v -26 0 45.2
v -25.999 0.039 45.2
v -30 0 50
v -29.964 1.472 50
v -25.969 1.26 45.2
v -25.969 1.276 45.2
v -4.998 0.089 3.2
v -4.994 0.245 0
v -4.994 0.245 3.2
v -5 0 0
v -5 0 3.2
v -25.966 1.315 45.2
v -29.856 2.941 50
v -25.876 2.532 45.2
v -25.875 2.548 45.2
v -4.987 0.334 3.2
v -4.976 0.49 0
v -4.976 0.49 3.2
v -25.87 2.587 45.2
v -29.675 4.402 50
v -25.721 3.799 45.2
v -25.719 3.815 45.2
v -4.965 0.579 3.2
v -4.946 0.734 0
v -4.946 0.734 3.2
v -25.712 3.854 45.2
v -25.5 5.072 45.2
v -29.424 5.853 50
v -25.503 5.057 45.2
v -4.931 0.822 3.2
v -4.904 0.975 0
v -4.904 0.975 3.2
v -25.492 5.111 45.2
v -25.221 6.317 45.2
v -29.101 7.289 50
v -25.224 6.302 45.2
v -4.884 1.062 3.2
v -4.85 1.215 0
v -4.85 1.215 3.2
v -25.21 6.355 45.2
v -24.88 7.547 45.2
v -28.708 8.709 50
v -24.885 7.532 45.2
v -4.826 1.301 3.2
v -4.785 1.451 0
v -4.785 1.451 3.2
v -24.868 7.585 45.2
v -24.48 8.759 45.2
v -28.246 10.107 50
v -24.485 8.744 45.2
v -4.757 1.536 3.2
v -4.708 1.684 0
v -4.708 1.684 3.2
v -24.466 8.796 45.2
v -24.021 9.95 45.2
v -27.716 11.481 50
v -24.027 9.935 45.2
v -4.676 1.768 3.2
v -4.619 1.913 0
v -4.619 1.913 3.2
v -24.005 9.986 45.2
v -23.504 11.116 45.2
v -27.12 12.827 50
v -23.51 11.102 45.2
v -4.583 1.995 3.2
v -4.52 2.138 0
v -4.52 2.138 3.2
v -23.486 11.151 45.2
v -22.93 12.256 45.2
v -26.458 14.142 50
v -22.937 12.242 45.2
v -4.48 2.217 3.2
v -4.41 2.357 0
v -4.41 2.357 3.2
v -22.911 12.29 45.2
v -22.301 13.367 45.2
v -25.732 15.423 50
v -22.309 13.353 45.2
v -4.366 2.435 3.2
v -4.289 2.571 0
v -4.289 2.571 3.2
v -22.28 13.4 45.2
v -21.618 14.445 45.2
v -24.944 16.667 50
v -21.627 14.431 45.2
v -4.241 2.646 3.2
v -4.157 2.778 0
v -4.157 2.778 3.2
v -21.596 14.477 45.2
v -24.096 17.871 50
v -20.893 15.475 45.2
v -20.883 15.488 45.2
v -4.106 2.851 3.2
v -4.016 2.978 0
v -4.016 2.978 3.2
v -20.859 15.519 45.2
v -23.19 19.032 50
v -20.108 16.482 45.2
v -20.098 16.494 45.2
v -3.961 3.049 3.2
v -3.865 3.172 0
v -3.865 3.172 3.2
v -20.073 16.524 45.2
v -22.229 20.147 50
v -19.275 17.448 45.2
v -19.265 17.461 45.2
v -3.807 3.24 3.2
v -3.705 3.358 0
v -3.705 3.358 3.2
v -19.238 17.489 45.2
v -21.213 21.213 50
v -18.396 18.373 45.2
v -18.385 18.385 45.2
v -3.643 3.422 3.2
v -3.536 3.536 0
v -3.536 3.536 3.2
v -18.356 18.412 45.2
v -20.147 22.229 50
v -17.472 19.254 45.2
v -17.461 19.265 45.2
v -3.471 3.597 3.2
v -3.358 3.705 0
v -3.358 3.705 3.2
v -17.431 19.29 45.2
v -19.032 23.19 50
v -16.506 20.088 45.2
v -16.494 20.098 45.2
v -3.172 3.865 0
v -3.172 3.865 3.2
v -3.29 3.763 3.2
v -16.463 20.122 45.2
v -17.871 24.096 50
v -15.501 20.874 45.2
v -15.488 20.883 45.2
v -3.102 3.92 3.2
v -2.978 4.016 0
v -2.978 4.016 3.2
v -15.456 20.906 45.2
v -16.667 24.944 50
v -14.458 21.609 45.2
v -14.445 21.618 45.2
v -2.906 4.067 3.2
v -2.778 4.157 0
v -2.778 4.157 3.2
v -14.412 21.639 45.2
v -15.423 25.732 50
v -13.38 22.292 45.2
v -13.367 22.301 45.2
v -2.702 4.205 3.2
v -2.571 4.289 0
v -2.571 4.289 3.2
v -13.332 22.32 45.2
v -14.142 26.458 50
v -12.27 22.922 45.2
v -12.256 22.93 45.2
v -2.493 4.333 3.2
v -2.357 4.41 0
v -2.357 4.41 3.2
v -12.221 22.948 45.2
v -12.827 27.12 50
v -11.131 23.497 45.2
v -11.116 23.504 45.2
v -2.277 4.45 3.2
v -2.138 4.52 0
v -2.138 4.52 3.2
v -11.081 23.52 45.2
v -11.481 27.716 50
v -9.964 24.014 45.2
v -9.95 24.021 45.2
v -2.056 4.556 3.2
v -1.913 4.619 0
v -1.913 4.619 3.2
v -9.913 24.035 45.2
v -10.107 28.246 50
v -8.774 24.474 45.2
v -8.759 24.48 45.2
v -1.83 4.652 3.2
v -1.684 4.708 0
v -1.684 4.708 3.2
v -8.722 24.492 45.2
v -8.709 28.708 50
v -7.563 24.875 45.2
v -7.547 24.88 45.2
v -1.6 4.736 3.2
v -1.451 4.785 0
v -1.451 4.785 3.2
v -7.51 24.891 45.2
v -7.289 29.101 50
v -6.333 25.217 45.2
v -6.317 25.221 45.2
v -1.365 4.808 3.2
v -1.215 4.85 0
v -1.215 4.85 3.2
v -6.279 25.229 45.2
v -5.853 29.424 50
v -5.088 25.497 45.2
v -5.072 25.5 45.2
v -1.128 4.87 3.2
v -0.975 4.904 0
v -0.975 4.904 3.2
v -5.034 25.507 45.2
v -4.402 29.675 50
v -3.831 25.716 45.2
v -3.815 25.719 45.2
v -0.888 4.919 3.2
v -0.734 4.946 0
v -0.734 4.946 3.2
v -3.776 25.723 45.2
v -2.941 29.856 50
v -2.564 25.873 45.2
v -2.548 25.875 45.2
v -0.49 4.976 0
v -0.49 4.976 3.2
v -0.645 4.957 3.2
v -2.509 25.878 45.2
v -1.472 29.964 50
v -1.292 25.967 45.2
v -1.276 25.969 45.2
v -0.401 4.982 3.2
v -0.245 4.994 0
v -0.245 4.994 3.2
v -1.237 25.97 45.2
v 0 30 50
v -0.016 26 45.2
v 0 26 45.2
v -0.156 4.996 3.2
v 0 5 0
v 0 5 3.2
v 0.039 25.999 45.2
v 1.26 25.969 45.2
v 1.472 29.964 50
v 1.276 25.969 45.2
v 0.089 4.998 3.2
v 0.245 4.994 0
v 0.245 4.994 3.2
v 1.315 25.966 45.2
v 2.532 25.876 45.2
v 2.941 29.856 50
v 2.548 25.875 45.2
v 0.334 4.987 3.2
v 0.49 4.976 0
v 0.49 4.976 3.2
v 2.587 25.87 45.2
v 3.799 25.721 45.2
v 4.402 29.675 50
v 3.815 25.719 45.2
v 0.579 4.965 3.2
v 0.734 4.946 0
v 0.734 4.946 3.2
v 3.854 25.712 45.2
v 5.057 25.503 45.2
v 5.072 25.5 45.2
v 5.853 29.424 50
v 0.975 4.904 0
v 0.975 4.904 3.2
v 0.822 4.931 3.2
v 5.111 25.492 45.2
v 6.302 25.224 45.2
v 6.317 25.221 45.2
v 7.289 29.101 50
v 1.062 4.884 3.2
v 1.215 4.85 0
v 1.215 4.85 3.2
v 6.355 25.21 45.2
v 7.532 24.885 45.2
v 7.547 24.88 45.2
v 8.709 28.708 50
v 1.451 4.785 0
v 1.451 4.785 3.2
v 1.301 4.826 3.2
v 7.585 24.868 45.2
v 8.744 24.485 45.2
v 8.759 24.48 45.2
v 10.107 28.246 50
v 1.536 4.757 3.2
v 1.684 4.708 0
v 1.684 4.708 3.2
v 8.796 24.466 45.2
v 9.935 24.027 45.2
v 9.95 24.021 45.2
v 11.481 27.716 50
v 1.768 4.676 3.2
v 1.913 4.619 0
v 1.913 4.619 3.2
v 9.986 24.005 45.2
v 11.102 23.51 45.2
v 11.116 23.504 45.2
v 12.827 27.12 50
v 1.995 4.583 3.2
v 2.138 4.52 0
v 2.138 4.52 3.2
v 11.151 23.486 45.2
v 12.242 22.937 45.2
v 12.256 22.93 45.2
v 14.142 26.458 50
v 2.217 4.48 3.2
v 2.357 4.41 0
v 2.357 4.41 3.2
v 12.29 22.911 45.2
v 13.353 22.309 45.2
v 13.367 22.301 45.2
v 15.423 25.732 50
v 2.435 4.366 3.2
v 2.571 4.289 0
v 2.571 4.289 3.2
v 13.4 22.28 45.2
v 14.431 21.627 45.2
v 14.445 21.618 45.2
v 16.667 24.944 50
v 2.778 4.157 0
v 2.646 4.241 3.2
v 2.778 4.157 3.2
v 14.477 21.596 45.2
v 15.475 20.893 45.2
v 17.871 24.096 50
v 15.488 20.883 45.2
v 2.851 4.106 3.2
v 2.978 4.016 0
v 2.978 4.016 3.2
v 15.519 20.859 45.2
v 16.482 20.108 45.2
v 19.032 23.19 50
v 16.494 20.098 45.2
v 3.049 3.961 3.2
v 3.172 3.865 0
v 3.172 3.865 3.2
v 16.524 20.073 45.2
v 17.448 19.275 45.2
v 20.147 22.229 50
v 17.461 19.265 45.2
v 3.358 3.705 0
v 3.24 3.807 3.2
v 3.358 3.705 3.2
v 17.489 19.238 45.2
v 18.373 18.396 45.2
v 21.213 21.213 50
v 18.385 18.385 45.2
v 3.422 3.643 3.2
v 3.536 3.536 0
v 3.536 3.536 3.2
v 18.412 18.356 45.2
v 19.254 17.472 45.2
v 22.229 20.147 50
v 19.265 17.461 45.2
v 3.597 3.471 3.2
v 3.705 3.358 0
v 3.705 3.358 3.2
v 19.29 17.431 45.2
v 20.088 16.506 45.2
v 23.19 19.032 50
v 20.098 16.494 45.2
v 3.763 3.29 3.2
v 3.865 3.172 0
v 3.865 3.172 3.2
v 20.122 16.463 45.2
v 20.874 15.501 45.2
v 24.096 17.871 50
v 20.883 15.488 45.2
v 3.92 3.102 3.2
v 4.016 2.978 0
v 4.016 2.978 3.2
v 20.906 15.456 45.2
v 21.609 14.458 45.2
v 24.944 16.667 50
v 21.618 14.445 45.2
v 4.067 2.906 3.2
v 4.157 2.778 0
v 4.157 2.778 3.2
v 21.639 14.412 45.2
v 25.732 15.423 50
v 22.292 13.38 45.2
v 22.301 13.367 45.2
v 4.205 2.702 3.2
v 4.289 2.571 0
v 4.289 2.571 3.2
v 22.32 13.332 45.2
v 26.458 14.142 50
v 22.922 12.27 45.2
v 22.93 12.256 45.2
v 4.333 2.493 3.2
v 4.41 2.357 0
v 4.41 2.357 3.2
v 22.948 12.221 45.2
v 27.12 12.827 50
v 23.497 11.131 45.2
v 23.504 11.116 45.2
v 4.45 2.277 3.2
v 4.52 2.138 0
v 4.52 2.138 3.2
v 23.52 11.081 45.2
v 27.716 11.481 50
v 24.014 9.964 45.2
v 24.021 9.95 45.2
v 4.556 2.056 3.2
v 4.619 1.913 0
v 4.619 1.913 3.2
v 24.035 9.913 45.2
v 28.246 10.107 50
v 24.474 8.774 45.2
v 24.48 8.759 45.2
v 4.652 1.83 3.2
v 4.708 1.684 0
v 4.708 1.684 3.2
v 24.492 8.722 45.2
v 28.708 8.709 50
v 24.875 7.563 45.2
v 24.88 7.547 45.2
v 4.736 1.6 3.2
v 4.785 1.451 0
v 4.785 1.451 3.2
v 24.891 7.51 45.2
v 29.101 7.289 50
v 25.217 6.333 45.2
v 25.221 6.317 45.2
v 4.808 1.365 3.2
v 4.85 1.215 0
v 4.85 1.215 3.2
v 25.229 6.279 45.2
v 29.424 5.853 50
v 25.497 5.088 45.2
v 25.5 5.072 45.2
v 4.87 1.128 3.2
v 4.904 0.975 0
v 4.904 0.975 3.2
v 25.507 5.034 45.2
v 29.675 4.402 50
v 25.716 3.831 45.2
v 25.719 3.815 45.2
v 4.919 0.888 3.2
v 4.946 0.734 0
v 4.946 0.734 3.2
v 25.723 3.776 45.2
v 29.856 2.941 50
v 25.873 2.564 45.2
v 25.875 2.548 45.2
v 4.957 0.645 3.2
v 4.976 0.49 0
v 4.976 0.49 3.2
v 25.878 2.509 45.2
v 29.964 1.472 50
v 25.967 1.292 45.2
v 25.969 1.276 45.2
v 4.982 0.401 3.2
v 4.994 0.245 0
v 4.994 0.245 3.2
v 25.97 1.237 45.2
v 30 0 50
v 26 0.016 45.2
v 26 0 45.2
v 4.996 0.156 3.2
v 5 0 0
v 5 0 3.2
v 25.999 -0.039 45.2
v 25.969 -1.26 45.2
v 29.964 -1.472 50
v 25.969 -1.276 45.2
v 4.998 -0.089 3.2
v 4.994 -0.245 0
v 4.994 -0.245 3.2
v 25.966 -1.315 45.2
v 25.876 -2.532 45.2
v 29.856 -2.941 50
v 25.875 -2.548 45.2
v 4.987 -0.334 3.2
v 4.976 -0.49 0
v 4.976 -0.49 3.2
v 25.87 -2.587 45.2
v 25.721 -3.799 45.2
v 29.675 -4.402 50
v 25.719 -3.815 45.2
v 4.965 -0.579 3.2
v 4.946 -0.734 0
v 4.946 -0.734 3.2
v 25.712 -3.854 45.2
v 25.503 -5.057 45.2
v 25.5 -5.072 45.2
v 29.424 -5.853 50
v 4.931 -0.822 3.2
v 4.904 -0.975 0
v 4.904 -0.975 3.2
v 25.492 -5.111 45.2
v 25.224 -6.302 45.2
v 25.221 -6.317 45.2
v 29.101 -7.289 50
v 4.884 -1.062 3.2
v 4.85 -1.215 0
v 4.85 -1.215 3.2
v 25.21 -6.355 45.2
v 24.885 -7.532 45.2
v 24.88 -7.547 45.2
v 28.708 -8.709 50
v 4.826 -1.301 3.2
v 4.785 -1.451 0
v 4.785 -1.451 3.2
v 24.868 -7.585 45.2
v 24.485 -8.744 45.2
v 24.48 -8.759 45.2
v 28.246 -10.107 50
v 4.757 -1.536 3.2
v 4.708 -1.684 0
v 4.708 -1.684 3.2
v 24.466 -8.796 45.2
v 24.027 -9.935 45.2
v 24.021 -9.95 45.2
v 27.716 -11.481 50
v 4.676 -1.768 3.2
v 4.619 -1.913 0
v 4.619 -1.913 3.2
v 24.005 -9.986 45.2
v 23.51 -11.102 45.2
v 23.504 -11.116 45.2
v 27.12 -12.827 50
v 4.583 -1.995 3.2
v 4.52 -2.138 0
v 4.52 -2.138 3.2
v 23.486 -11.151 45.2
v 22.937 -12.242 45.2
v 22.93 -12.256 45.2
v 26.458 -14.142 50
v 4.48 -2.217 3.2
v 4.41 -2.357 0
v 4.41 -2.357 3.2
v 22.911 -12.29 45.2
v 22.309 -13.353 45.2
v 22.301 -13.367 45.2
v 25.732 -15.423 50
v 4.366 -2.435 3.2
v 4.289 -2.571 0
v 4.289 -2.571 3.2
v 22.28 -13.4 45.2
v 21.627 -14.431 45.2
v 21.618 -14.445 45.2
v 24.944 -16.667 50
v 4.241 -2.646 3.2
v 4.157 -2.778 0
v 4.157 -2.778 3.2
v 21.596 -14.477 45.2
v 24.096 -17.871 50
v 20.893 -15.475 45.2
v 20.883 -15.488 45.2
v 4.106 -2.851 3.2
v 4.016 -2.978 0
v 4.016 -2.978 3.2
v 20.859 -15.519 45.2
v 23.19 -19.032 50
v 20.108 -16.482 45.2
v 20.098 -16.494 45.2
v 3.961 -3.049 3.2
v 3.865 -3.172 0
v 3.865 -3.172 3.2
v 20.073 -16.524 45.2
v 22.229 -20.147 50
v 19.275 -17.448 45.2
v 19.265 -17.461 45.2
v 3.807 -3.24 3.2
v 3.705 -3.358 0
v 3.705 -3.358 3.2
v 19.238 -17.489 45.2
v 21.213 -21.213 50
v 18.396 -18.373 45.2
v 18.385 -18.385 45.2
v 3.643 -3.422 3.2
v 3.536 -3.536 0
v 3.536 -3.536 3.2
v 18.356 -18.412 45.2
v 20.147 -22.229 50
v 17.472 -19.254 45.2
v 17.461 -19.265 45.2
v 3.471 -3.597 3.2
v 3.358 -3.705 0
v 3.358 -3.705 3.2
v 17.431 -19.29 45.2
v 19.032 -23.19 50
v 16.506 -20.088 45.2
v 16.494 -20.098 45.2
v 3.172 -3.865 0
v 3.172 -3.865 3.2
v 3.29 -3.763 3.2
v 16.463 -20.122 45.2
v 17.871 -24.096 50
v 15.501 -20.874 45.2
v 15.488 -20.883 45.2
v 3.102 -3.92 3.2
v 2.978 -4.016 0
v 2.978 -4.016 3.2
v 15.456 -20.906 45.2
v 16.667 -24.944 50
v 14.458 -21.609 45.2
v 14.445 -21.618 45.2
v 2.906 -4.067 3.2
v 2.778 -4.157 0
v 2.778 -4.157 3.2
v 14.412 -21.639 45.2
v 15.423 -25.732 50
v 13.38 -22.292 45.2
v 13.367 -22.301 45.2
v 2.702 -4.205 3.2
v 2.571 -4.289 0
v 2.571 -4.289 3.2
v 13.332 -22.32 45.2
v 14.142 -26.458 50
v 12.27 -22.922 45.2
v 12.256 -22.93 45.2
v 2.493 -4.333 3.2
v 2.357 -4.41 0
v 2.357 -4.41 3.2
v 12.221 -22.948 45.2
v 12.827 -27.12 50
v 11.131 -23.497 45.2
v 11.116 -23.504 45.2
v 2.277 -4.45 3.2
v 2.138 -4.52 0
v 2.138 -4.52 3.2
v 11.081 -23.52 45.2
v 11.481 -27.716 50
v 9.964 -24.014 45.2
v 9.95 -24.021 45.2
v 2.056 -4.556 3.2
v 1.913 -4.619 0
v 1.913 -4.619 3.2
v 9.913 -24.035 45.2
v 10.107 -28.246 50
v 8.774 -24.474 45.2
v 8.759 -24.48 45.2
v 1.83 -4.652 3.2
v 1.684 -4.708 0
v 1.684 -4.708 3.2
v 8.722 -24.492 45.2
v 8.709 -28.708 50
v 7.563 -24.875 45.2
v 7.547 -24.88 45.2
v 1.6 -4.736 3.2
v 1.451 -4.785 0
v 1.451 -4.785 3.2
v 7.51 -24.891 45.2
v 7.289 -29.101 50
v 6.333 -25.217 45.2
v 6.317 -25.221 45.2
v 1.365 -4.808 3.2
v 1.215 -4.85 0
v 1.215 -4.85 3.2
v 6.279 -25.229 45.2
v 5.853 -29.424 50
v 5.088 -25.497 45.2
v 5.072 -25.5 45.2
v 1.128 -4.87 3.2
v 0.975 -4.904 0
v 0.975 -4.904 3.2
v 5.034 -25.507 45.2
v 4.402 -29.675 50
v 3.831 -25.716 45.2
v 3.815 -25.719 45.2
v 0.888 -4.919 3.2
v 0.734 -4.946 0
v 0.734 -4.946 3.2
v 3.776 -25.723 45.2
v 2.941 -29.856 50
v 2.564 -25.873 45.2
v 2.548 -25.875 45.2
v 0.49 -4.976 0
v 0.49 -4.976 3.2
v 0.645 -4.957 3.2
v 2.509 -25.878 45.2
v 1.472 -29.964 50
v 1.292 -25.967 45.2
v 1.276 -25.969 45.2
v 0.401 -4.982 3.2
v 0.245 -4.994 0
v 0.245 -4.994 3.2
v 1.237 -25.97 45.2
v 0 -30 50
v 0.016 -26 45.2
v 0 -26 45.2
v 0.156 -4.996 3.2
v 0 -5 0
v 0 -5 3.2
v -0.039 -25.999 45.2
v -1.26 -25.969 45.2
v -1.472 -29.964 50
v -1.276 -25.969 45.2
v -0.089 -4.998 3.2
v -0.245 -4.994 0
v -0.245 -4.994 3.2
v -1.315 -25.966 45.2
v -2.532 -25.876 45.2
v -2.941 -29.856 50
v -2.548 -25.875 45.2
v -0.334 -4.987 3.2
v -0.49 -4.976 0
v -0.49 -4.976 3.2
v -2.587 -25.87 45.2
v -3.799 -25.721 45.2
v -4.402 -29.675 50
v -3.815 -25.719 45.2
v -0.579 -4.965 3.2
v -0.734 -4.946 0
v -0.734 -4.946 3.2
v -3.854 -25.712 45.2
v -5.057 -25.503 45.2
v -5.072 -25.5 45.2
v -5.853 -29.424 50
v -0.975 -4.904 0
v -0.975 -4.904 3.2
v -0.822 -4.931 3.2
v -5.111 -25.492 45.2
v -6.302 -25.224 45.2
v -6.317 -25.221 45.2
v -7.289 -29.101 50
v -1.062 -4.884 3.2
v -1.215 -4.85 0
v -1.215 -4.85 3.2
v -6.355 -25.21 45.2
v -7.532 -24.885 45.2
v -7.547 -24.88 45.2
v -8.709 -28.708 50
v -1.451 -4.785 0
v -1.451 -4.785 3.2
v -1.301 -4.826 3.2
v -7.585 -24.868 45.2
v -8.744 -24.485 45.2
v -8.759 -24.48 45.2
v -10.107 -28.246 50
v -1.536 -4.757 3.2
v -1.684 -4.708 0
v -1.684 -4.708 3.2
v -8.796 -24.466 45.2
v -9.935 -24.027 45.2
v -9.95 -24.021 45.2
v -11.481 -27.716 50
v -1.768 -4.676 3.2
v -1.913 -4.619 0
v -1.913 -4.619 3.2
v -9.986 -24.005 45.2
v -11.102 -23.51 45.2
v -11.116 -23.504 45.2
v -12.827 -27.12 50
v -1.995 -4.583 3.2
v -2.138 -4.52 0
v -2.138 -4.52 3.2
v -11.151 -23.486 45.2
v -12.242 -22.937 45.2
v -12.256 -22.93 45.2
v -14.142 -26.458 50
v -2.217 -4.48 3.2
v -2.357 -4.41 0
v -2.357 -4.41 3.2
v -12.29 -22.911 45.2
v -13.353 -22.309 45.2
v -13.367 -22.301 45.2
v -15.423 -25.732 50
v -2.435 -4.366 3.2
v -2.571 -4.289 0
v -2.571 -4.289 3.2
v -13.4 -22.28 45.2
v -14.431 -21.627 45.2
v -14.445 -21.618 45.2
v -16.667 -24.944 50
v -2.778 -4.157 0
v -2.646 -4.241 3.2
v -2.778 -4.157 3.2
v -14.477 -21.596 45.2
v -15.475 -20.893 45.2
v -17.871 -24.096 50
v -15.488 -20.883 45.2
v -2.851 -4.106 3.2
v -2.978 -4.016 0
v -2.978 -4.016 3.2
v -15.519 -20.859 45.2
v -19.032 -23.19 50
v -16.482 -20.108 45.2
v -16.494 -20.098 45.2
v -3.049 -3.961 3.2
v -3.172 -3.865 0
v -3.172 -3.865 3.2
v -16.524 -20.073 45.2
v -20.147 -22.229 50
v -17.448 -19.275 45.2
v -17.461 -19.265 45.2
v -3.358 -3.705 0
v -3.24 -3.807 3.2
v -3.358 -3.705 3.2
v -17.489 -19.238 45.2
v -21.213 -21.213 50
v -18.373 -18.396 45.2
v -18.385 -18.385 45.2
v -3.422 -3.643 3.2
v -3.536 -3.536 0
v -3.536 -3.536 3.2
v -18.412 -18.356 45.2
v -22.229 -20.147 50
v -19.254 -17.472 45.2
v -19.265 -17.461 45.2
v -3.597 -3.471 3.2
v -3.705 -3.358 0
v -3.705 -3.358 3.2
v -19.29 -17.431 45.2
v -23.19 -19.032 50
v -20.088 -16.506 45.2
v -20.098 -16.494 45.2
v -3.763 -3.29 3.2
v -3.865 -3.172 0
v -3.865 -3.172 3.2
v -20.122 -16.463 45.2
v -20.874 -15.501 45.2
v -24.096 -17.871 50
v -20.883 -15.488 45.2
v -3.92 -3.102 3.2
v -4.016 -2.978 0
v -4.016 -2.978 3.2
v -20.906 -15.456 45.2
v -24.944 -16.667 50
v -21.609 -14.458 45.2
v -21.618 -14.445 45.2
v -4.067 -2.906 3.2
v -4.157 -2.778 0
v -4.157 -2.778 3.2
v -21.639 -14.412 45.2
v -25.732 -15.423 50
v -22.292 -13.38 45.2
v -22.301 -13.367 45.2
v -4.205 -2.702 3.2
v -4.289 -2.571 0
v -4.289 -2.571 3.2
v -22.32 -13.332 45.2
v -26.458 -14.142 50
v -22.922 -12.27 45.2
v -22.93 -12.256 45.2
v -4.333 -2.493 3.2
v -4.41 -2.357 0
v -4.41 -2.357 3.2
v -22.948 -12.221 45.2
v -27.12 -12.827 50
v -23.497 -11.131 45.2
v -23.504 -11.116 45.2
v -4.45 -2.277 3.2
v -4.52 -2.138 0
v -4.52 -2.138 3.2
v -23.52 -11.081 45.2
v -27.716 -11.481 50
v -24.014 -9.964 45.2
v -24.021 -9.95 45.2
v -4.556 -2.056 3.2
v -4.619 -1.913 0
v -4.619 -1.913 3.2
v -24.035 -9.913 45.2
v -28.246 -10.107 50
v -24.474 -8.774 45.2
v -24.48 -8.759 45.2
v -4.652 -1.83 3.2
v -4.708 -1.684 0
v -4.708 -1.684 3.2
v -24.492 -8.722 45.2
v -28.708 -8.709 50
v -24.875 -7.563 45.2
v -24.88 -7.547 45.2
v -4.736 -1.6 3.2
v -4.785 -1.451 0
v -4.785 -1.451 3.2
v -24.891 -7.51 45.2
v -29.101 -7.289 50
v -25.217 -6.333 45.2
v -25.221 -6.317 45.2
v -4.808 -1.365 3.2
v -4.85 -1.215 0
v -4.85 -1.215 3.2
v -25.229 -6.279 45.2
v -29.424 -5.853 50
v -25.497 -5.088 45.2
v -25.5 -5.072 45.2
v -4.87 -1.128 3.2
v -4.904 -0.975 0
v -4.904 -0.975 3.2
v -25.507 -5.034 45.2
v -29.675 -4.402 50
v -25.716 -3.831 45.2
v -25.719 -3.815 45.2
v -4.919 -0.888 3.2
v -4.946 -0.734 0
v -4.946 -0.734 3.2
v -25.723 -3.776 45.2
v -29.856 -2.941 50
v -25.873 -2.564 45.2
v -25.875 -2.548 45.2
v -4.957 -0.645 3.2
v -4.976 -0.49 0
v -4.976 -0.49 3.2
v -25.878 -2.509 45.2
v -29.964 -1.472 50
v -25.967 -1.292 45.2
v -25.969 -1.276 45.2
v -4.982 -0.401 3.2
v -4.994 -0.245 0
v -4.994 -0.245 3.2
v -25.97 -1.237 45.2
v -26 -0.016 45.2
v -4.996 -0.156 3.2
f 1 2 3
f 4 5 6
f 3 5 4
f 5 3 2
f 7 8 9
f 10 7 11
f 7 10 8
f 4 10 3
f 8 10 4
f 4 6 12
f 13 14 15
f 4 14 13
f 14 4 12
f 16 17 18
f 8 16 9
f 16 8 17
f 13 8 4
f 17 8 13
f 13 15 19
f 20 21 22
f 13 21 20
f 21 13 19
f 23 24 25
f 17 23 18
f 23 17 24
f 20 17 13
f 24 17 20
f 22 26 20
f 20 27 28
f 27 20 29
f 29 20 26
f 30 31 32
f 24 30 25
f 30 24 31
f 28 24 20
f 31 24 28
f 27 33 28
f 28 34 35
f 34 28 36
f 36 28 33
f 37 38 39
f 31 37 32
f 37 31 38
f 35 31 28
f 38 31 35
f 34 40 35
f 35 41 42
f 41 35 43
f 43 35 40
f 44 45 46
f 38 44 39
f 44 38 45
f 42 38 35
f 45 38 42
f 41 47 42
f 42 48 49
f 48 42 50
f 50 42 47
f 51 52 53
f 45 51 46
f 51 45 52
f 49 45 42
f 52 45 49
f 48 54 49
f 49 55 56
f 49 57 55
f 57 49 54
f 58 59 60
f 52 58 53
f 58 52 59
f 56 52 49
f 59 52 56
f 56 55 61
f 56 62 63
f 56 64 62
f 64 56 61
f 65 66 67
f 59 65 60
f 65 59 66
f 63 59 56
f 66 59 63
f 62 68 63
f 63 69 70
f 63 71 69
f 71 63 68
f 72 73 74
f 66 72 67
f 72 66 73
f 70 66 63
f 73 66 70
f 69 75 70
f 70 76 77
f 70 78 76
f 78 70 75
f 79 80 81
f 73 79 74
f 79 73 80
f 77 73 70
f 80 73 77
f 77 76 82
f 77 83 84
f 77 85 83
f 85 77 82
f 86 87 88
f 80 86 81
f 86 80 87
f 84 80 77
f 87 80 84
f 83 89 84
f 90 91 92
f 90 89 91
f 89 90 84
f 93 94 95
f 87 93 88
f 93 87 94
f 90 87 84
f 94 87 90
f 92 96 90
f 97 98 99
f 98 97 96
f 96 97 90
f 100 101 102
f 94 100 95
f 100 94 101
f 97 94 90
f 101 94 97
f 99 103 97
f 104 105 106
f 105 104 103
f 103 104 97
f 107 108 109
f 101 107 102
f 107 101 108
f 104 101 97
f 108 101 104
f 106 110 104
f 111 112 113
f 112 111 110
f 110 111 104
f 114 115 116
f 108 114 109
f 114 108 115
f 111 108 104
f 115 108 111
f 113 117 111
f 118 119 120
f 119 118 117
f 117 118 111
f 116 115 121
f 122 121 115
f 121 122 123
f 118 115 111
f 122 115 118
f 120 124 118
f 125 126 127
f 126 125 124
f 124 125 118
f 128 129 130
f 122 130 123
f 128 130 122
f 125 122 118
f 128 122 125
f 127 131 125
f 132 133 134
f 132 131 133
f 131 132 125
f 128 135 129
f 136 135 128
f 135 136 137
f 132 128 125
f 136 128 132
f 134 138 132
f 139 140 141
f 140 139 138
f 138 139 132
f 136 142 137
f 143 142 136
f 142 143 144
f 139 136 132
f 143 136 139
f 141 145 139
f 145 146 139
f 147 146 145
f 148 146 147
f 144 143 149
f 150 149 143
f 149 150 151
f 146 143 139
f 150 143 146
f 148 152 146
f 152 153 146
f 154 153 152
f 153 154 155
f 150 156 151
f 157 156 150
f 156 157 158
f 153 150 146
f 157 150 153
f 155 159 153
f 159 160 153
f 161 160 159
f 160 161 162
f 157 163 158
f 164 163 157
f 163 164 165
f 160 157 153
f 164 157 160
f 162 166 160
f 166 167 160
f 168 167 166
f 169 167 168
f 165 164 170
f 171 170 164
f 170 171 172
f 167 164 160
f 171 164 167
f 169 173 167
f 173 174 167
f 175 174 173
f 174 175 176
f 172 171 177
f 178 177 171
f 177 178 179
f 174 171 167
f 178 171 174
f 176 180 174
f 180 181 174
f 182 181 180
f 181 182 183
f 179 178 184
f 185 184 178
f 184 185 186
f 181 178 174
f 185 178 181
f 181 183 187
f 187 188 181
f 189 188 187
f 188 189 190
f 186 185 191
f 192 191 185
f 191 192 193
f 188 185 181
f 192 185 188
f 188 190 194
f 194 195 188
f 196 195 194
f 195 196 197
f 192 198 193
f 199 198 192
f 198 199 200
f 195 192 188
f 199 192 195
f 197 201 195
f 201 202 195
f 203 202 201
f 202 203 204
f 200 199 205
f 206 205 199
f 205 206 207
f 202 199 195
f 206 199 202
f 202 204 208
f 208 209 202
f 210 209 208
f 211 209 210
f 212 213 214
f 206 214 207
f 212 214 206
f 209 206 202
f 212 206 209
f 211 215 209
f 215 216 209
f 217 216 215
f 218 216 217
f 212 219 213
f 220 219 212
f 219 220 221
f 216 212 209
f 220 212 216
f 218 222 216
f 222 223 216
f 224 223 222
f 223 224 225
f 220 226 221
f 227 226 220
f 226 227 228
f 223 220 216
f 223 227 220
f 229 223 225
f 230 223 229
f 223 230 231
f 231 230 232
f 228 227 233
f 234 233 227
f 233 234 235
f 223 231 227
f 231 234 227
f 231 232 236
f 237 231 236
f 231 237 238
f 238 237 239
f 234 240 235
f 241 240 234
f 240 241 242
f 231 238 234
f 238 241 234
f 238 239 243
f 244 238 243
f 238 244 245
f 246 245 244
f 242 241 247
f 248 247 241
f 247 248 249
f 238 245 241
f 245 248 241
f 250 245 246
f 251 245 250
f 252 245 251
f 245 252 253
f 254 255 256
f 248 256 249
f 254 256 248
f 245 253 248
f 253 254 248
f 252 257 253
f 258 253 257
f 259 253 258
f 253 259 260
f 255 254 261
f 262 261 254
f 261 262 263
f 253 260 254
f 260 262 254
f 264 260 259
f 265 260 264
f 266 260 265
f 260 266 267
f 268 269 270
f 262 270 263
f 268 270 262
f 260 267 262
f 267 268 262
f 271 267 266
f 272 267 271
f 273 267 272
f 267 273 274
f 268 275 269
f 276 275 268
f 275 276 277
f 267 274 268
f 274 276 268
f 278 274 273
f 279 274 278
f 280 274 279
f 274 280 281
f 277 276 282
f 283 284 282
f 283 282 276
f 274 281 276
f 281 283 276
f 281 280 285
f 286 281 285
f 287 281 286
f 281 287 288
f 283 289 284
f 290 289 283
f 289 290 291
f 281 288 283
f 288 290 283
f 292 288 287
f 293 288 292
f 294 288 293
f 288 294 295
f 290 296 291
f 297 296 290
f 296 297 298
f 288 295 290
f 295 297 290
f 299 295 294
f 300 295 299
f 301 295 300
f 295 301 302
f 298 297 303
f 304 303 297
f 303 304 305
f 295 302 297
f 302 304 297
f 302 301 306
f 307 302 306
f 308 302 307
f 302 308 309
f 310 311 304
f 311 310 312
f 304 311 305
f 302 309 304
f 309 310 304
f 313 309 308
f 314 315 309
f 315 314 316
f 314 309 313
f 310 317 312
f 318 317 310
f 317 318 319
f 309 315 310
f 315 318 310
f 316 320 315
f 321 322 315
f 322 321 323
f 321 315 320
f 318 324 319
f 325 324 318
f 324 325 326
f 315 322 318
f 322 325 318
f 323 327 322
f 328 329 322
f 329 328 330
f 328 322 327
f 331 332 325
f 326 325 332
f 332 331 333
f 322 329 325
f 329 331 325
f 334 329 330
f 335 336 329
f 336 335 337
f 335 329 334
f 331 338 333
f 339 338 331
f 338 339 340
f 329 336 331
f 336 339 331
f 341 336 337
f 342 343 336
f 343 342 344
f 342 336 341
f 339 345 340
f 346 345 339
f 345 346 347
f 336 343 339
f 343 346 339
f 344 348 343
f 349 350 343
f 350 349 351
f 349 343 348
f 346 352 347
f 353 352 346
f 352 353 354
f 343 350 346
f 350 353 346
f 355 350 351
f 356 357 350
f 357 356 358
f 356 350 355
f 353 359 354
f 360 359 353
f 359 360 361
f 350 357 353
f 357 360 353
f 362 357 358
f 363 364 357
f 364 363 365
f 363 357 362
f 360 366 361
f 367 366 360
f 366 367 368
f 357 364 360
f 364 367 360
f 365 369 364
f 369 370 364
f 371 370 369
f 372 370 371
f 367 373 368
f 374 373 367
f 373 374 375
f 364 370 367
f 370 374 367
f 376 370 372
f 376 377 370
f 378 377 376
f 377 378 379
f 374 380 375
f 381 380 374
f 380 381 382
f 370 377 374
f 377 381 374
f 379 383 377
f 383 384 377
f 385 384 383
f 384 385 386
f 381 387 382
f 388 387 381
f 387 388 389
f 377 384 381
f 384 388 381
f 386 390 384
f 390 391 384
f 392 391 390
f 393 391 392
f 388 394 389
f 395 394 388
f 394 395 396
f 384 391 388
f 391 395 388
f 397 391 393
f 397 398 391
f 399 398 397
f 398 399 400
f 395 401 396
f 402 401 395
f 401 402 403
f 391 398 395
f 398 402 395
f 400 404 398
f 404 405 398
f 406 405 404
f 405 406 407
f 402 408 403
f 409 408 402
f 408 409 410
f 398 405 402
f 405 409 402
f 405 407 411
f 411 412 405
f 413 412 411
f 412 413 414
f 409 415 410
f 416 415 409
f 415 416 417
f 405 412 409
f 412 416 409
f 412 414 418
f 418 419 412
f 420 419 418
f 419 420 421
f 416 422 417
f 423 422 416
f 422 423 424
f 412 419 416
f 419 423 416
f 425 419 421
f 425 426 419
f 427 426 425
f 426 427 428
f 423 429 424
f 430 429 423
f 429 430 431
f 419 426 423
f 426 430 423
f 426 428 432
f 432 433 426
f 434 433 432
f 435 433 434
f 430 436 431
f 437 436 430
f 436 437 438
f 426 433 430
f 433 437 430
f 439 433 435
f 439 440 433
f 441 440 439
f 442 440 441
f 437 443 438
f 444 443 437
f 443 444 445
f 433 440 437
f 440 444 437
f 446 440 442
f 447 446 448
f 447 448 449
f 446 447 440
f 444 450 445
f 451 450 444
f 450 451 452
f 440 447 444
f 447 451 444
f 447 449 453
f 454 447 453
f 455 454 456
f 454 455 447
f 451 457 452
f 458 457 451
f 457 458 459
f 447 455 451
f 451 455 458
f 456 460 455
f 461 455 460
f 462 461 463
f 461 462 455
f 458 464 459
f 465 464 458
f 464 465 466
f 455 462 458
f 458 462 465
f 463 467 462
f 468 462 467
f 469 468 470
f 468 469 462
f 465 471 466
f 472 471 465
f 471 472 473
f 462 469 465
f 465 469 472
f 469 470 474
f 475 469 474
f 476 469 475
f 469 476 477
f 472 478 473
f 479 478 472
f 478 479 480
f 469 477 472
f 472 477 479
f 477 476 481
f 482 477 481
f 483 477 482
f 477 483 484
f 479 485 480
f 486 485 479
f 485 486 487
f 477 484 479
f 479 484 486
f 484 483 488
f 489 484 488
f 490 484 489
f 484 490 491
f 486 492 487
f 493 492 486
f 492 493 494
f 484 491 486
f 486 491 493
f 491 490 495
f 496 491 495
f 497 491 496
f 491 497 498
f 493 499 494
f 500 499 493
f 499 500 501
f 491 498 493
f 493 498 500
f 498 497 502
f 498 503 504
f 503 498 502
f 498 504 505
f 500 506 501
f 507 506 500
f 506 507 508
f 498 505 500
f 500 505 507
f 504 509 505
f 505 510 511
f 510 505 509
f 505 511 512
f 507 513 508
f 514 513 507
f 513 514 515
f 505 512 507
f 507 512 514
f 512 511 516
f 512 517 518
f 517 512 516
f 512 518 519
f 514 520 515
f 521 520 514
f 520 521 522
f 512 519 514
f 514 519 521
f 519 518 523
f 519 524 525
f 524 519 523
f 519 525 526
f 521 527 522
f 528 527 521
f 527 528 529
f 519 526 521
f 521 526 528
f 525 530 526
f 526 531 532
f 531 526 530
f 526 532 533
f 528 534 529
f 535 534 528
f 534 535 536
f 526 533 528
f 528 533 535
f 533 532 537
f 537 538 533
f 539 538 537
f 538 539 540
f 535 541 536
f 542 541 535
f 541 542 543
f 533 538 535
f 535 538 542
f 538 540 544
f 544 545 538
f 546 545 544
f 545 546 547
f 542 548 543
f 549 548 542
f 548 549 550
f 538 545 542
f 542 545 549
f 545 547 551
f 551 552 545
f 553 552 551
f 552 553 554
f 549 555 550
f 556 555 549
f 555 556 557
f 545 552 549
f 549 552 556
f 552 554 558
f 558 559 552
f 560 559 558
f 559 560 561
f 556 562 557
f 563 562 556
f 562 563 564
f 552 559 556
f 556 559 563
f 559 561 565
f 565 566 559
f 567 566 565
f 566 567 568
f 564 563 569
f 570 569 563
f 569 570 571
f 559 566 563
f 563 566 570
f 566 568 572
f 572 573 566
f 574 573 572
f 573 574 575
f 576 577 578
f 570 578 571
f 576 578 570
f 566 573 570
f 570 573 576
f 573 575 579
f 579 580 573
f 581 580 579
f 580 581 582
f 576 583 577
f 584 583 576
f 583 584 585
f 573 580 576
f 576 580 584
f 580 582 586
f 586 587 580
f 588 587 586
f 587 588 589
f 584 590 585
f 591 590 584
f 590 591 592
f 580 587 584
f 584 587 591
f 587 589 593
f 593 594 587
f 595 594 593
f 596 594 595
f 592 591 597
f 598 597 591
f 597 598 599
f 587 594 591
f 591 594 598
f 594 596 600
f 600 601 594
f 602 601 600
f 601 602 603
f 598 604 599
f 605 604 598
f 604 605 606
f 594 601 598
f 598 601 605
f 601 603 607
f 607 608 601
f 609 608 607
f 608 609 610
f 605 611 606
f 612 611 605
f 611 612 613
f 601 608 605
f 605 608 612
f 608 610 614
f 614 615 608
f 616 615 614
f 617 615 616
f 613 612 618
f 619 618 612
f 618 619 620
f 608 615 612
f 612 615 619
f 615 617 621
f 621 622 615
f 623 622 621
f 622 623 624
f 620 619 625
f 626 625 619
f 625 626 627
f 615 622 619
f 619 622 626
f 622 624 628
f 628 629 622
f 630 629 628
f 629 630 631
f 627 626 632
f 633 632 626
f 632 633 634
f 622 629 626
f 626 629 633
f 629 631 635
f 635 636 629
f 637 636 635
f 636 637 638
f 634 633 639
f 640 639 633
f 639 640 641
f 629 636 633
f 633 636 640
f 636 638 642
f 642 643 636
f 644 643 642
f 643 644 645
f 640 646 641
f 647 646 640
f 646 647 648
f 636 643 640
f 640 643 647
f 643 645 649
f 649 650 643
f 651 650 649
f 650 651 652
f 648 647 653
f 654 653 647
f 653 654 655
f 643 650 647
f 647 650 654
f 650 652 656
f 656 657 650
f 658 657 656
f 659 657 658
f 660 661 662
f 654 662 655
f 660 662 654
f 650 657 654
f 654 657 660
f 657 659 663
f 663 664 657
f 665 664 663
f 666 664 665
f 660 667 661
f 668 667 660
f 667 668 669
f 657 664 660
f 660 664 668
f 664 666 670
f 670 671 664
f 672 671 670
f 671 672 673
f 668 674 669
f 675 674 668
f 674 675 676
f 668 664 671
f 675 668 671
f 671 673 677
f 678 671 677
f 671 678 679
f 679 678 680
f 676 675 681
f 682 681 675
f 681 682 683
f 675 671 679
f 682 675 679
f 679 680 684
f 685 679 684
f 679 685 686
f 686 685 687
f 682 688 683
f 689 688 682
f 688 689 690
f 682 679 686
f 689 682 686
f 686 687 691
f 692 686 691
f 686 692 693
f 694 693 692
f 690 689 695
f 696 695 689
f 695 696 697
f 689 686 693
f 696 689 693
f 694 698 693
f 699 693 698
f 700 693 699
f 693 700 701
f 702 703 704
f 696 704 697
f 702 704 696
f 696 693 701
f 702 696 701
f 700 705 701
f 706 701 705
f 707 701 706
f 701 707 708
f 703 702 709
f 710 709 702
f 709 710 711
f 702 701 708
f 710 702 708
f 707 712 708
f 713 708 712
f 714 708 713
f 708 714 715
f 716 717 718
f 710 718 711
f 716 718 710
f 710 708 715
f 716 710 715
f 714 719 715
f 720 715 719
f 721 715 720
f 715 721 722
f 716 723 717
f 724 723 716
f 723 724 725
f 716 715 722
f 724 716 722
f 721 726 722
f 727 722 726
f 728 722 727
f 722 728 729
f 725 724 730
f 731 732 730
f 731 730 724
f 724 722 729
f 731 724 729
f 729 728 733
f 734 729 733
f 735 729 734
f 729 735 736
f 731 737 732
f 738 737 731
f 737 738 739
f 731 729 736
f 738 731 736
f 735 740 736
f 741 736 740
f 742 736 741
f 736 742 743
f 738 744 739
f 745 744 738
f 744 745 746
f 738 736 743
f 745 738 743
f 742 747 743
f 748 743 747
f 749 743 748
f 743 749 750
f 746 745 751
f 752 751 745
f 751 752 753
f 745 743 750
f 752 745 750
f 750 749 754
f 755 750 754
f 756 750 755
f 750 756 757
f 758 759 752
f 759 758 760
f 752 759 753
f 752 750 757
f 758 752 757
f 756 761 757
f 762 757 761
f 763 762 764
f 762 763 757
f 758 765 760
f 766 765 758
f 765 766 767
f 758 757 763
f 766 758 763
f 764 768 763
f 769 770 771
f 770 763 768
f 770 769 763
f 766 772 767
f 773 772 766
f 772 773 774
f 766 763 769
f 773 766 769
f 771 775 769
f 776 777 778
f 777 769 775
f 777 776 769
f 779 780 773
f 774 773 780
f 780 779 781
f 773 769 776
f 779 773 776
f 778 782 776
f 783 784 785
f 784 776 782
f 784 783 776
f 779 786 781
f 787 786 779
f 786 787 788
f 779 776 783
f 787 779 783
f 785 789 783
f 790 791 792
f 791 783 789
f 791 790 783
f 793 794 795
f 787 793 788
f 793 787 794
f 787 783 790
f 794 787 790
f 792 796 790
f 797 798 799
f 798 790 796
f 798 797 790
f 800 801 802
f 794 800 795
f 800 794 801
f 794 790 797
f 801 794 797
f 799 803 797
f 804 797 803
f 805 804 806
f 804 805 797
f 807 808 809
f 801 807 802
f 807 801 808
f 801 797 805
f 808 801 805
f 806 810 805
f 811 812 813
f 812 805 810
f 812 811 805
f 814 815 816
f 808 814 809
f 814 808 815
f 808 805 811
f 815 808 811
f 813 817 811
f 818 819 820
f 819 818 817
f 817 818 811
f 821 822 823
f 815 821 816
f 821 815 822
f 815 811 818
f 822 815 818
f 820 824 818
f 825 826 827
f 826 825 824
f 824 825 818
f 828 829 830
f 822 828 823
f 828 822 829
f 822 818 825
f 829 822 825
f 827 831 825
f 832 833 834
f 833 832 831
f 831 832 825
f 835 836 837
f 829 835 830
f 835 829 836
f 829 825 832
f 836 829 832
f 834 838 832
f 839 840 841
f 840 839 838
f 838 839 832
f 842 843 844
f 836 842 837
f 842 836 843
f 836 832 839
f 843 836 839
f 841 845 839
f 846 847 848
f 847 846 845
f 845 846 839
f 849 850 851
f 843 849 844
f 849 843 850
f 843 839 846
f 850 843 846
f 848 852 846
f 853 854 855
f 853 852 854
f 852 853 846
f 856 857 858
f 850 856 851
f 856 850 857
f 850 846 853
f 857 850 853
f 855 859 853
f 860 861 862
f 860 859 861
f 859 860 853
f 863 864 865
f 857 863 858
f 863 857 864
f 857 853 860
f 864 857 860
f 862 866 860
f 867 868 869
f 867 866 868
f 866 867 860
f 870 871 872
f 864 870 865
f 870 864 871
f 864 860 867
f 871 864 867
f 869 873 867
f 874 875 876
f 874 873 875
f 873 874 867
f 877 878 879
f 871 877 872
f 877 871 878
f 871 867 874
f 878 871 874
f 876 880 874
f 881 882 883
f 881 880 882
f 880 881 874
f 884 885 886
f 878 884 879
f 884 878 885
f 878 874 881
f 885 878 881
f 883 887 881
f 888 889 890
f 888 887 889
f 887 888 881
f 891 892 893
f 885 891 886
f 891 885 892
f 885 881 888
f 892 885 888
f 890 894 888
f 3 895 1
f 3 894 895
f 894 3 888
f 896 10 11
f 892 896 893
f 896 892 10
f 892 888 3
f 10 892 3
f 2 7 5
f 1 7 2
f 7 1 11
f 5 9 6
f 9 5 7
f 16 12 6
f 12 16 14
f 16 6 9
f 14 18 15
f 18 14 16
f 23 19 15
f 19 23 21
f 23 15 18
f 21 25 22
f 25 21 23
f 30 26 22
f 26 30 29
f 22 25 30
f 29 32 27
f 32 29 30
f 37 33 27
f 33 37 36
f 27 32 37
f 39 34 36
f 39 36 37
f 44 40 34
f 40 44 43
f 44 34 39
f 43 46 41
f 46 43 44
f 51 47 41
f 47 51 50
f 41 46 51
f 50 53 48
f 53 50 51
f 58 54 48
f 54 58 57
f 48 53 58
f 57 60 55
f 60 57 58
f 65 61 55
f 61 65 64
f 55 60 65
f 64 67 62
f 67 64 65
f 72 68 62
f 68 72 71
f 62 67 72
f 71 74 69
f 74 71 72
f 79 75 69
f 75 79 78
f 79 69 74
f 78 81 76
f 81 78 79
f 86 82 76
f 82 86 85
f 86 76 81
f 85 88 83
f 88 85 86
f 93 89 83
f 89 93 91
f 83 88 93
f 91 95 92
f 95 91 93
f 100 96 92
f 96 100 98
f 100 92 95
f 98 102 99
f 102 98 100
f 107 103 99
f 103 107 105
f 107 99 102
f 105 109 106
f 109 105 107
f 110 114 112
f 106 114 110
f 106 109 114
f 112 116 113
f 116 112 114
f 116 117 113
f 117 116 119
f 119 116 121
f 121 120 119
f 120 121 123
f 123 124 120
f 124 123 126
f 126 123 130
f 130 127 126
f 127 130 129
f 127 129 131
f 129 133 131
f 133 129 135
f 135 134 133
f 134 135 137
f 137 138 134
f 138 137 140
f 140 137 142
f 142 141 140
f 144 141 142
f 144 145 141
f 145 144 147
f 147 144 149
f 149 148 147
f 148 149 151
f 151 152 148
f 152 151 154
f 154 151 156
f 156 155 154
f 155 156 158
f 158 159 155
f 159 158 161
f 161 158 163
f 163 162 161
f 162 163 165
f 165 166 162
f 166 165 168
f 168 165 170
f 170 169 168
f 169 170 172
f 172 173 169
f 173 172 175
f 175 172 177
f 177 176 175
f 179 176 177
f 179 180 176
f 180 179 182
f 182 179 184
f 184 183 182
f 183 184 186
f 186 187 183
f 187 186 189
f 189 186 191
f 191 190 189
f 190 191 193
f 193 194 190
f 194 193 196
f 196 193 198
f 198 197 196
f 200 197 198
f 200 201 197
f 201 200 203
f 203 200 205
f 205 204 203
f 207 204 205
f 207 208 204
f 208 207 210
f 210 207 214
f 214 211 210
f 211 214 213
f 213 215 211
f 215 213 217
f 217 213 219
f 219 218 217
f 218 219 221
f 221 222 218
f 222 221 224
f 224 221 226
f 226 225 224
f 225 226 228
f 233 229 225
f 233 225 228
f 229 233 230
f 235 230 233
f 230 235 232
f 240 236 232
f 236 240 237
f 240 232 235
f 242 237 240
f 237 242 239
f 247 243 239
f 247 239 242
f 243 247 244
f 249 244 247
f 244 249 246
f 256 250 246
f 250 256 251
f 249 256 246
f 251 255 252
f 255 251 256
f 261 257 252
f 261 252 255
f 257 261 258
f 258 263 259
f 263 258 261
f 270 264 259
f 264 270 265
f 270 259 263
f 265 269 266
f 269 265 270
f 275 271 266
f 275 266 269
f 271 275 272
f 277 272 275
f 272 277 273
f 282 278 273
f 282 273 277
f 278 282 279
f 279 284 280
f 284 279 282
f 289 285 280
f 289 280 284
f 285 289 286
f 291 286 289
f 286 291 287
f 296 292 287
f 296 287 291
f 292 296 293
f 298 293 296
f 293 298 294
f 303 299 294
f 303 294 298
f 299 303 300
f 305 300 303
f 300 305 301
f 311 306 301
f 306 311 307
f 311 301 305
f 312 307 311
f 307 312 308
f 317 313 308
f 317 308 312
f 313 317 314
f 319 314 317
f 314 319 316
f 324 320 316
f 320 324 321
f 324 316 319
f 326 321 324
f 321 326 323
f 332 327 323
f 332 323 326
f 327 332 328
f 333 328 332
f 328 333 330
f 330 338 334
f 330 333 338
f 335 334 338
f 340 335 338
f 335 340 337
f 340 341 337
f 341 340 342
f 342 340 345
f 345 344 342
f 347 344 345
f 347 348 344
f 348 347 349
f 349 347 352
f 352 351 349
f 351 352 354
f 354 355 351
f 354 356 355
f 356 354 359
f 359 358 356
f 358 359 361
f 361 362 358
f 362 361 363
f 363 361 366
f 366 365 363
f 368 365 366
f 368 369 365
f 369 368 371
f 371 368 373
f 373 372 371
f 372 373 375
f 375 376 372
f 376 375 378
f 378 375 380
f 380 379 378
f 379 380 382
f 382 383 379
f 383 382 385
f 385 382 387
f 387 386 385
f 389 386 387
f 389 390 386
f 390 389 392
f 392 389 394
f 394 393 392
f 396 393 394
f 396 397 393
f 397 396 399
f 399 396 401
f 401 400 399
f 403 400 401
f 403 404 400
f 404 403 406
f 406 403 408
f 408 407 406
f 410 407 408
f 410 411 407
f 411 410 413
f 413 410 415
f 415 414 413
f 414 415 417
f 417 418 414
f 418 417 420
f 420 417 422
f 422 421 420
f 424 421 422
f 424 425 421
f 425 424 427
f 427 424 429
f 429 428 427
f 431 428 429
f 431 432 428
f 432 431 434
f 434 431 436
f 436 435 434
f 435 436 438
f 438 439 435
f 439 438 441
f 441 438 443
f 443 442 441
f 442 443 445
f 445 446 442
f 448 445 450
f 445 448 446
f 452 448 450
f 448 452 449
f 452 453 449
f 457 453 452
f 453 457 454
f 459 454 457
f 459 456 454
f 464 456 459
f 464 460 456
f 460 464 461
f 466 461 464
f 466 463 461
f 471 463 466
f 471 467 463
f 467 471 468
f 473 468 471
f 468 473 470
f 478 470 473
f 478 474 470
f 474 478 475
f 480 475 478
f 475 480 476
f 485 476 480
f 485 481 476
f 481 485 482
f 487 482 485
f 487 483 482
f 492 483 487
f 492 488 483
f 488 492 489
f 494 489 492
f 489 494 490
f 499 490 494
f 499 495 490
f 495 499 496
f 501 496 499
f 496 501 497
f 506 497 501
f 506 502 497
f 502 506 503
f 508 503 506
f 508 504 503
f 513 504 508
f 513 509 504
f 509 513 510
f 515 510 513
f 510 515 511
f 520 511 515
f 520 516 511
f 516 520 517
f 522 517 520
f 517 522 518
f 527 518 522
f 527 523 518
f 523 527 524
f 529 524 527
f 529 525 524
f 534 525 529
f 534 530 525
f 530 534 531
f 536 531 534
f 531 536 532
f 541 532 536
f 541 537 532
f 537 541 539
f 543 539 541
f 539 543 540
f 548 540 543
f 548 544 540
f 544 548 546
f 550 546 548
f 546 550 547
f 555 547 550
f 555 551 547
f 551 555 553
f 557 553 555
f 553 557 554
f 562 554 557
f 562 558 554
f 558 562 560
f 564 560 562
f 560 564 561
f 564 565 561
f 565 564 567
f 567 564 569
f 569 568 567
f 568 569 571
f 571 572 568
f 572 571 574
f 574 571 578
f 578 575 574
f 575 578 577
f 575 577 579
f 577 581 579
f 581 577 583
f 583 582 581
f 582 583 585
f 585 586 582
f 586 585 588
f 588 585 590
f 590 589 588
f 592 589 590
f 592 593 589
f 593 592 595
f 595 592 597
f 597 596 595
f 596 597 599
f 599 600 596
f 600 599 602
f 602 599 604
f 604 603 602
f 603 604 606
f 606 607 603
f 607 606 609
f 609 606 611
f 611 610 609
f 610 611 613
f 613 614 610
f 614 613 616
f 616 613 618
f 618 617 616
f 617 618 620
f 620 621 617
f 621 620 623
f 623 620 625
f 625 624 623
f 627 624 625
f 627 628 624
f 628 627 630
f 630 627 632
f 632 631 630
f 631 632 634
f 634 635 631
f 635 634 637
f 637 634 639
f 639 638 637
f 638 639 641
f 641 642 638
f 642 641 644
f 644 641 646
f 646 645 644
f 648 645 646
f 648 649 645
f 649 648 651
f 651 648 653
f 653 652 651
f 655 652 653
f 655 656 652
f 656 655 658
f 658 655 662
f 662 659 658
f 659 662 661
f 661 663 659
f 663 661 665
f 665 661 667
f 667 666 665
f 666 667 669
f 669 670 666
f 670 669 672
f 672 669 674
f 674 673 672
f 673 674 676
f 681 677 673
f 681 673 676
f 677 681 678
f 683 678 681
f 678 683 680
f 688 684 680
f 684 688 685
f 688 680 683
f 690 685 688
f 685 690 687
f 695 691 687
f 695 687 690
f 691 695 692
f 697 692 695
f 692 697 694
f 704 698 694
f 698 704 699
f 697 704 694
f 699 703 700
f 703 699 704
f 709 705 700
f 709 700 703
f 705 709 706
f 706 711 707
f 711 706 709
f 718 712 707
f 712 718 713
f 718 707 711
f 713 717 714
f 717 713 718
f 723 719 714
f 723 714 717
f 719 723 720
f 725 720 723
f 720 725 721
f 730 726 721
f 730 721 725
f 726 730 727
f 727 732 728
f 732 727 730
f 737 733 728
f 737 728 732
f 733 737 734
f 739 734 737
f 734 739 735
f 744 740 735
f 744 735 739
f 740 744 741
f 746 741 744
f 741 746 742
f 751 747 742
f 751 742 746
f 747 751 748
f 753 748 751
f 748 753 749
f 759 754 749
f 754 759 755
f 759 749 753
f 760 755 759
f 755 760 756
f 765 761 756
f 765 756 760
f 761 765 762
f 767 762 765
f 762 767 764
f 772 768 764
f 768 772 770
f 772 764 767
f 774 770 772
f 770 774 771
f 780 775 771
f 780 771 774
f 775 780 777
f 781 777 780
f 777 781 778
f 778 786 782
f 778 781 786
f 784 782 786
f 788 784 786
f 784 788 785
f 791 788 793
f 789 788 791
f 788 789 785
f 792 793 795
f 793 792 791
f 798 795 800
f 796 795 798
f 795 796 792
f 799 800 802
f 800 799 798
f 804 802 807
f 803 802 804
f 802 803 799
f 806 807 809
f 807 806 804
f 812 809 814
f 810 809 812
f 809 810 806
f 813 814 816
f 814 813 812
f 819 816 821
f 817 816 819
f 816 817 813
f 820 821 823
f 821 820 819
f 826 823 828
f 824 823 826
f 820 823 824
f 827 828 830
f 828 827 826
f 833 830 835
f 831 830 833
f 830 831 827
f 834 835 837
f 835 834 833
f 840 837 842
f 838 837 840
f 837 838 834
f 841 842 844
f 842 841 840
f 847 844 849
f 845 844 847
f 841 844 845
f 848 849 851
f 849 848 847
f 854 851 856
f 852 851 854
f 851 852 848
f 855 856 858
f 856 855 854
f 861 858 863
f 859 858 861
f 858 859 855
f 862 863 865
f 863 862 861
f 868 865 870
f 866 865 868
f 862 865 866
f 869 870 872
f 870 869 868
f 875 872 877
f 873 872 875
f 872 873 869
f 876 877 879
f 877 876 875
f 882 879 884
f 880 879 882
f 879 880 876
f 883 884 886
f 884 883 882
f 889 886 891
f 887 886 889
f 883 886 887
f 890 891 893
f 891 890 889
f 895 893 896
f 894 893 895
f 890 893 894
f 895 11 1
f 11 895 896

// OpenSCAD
// Lab funnel - straight spout with conical body, open top and bottom.
// Printed upright, wide opening at top (z=50), spout at bottom (z=0).

// Dimensions
spout_od      = 10;      // Outer diameter of straight spout
spout_id      = 6.8;     // Inner diameter of straight spout (10 - 2*1.6)
spout_len     = 20;      // Length of straight spout
funnel_start  = 20;      // Z position where cone begins
funnel_end    = 50;      // Z position of funnel rim
funnel_od     = 60;      // Outer diameter at rim
funnel_id     = 56.8;    // Inner diameter at rim (60 - 2*1.6)
wall_thick    = 1.6;     // Wall thickness everywhere

$fn = 128;

// Outer Profile Points [radius, z]
// Start at z=0, r=5. End at z=50, r=30.
outer_points = [
    [spout_od / 2, 0],
    [spout_od / 2, funnel_start],
    [funnel_od / 2, funnel_end]
];

// Inner Profile Points [radius, z]
// Start at z=0, r=3.4. End at z=50, r=28.4.
inner_points = [
    [spout_id / 2, 0],
    [spout_id / 2, funnel_start],
    [funnel_id / 2, funnel_end]
];

difference() {
    // Create the outer solid
    rotate_extrude() 
        polygon(outer_points);
    
    // Create the inner void (hole)
    rotate_extrude() 
        polygon(inner_points);
}
